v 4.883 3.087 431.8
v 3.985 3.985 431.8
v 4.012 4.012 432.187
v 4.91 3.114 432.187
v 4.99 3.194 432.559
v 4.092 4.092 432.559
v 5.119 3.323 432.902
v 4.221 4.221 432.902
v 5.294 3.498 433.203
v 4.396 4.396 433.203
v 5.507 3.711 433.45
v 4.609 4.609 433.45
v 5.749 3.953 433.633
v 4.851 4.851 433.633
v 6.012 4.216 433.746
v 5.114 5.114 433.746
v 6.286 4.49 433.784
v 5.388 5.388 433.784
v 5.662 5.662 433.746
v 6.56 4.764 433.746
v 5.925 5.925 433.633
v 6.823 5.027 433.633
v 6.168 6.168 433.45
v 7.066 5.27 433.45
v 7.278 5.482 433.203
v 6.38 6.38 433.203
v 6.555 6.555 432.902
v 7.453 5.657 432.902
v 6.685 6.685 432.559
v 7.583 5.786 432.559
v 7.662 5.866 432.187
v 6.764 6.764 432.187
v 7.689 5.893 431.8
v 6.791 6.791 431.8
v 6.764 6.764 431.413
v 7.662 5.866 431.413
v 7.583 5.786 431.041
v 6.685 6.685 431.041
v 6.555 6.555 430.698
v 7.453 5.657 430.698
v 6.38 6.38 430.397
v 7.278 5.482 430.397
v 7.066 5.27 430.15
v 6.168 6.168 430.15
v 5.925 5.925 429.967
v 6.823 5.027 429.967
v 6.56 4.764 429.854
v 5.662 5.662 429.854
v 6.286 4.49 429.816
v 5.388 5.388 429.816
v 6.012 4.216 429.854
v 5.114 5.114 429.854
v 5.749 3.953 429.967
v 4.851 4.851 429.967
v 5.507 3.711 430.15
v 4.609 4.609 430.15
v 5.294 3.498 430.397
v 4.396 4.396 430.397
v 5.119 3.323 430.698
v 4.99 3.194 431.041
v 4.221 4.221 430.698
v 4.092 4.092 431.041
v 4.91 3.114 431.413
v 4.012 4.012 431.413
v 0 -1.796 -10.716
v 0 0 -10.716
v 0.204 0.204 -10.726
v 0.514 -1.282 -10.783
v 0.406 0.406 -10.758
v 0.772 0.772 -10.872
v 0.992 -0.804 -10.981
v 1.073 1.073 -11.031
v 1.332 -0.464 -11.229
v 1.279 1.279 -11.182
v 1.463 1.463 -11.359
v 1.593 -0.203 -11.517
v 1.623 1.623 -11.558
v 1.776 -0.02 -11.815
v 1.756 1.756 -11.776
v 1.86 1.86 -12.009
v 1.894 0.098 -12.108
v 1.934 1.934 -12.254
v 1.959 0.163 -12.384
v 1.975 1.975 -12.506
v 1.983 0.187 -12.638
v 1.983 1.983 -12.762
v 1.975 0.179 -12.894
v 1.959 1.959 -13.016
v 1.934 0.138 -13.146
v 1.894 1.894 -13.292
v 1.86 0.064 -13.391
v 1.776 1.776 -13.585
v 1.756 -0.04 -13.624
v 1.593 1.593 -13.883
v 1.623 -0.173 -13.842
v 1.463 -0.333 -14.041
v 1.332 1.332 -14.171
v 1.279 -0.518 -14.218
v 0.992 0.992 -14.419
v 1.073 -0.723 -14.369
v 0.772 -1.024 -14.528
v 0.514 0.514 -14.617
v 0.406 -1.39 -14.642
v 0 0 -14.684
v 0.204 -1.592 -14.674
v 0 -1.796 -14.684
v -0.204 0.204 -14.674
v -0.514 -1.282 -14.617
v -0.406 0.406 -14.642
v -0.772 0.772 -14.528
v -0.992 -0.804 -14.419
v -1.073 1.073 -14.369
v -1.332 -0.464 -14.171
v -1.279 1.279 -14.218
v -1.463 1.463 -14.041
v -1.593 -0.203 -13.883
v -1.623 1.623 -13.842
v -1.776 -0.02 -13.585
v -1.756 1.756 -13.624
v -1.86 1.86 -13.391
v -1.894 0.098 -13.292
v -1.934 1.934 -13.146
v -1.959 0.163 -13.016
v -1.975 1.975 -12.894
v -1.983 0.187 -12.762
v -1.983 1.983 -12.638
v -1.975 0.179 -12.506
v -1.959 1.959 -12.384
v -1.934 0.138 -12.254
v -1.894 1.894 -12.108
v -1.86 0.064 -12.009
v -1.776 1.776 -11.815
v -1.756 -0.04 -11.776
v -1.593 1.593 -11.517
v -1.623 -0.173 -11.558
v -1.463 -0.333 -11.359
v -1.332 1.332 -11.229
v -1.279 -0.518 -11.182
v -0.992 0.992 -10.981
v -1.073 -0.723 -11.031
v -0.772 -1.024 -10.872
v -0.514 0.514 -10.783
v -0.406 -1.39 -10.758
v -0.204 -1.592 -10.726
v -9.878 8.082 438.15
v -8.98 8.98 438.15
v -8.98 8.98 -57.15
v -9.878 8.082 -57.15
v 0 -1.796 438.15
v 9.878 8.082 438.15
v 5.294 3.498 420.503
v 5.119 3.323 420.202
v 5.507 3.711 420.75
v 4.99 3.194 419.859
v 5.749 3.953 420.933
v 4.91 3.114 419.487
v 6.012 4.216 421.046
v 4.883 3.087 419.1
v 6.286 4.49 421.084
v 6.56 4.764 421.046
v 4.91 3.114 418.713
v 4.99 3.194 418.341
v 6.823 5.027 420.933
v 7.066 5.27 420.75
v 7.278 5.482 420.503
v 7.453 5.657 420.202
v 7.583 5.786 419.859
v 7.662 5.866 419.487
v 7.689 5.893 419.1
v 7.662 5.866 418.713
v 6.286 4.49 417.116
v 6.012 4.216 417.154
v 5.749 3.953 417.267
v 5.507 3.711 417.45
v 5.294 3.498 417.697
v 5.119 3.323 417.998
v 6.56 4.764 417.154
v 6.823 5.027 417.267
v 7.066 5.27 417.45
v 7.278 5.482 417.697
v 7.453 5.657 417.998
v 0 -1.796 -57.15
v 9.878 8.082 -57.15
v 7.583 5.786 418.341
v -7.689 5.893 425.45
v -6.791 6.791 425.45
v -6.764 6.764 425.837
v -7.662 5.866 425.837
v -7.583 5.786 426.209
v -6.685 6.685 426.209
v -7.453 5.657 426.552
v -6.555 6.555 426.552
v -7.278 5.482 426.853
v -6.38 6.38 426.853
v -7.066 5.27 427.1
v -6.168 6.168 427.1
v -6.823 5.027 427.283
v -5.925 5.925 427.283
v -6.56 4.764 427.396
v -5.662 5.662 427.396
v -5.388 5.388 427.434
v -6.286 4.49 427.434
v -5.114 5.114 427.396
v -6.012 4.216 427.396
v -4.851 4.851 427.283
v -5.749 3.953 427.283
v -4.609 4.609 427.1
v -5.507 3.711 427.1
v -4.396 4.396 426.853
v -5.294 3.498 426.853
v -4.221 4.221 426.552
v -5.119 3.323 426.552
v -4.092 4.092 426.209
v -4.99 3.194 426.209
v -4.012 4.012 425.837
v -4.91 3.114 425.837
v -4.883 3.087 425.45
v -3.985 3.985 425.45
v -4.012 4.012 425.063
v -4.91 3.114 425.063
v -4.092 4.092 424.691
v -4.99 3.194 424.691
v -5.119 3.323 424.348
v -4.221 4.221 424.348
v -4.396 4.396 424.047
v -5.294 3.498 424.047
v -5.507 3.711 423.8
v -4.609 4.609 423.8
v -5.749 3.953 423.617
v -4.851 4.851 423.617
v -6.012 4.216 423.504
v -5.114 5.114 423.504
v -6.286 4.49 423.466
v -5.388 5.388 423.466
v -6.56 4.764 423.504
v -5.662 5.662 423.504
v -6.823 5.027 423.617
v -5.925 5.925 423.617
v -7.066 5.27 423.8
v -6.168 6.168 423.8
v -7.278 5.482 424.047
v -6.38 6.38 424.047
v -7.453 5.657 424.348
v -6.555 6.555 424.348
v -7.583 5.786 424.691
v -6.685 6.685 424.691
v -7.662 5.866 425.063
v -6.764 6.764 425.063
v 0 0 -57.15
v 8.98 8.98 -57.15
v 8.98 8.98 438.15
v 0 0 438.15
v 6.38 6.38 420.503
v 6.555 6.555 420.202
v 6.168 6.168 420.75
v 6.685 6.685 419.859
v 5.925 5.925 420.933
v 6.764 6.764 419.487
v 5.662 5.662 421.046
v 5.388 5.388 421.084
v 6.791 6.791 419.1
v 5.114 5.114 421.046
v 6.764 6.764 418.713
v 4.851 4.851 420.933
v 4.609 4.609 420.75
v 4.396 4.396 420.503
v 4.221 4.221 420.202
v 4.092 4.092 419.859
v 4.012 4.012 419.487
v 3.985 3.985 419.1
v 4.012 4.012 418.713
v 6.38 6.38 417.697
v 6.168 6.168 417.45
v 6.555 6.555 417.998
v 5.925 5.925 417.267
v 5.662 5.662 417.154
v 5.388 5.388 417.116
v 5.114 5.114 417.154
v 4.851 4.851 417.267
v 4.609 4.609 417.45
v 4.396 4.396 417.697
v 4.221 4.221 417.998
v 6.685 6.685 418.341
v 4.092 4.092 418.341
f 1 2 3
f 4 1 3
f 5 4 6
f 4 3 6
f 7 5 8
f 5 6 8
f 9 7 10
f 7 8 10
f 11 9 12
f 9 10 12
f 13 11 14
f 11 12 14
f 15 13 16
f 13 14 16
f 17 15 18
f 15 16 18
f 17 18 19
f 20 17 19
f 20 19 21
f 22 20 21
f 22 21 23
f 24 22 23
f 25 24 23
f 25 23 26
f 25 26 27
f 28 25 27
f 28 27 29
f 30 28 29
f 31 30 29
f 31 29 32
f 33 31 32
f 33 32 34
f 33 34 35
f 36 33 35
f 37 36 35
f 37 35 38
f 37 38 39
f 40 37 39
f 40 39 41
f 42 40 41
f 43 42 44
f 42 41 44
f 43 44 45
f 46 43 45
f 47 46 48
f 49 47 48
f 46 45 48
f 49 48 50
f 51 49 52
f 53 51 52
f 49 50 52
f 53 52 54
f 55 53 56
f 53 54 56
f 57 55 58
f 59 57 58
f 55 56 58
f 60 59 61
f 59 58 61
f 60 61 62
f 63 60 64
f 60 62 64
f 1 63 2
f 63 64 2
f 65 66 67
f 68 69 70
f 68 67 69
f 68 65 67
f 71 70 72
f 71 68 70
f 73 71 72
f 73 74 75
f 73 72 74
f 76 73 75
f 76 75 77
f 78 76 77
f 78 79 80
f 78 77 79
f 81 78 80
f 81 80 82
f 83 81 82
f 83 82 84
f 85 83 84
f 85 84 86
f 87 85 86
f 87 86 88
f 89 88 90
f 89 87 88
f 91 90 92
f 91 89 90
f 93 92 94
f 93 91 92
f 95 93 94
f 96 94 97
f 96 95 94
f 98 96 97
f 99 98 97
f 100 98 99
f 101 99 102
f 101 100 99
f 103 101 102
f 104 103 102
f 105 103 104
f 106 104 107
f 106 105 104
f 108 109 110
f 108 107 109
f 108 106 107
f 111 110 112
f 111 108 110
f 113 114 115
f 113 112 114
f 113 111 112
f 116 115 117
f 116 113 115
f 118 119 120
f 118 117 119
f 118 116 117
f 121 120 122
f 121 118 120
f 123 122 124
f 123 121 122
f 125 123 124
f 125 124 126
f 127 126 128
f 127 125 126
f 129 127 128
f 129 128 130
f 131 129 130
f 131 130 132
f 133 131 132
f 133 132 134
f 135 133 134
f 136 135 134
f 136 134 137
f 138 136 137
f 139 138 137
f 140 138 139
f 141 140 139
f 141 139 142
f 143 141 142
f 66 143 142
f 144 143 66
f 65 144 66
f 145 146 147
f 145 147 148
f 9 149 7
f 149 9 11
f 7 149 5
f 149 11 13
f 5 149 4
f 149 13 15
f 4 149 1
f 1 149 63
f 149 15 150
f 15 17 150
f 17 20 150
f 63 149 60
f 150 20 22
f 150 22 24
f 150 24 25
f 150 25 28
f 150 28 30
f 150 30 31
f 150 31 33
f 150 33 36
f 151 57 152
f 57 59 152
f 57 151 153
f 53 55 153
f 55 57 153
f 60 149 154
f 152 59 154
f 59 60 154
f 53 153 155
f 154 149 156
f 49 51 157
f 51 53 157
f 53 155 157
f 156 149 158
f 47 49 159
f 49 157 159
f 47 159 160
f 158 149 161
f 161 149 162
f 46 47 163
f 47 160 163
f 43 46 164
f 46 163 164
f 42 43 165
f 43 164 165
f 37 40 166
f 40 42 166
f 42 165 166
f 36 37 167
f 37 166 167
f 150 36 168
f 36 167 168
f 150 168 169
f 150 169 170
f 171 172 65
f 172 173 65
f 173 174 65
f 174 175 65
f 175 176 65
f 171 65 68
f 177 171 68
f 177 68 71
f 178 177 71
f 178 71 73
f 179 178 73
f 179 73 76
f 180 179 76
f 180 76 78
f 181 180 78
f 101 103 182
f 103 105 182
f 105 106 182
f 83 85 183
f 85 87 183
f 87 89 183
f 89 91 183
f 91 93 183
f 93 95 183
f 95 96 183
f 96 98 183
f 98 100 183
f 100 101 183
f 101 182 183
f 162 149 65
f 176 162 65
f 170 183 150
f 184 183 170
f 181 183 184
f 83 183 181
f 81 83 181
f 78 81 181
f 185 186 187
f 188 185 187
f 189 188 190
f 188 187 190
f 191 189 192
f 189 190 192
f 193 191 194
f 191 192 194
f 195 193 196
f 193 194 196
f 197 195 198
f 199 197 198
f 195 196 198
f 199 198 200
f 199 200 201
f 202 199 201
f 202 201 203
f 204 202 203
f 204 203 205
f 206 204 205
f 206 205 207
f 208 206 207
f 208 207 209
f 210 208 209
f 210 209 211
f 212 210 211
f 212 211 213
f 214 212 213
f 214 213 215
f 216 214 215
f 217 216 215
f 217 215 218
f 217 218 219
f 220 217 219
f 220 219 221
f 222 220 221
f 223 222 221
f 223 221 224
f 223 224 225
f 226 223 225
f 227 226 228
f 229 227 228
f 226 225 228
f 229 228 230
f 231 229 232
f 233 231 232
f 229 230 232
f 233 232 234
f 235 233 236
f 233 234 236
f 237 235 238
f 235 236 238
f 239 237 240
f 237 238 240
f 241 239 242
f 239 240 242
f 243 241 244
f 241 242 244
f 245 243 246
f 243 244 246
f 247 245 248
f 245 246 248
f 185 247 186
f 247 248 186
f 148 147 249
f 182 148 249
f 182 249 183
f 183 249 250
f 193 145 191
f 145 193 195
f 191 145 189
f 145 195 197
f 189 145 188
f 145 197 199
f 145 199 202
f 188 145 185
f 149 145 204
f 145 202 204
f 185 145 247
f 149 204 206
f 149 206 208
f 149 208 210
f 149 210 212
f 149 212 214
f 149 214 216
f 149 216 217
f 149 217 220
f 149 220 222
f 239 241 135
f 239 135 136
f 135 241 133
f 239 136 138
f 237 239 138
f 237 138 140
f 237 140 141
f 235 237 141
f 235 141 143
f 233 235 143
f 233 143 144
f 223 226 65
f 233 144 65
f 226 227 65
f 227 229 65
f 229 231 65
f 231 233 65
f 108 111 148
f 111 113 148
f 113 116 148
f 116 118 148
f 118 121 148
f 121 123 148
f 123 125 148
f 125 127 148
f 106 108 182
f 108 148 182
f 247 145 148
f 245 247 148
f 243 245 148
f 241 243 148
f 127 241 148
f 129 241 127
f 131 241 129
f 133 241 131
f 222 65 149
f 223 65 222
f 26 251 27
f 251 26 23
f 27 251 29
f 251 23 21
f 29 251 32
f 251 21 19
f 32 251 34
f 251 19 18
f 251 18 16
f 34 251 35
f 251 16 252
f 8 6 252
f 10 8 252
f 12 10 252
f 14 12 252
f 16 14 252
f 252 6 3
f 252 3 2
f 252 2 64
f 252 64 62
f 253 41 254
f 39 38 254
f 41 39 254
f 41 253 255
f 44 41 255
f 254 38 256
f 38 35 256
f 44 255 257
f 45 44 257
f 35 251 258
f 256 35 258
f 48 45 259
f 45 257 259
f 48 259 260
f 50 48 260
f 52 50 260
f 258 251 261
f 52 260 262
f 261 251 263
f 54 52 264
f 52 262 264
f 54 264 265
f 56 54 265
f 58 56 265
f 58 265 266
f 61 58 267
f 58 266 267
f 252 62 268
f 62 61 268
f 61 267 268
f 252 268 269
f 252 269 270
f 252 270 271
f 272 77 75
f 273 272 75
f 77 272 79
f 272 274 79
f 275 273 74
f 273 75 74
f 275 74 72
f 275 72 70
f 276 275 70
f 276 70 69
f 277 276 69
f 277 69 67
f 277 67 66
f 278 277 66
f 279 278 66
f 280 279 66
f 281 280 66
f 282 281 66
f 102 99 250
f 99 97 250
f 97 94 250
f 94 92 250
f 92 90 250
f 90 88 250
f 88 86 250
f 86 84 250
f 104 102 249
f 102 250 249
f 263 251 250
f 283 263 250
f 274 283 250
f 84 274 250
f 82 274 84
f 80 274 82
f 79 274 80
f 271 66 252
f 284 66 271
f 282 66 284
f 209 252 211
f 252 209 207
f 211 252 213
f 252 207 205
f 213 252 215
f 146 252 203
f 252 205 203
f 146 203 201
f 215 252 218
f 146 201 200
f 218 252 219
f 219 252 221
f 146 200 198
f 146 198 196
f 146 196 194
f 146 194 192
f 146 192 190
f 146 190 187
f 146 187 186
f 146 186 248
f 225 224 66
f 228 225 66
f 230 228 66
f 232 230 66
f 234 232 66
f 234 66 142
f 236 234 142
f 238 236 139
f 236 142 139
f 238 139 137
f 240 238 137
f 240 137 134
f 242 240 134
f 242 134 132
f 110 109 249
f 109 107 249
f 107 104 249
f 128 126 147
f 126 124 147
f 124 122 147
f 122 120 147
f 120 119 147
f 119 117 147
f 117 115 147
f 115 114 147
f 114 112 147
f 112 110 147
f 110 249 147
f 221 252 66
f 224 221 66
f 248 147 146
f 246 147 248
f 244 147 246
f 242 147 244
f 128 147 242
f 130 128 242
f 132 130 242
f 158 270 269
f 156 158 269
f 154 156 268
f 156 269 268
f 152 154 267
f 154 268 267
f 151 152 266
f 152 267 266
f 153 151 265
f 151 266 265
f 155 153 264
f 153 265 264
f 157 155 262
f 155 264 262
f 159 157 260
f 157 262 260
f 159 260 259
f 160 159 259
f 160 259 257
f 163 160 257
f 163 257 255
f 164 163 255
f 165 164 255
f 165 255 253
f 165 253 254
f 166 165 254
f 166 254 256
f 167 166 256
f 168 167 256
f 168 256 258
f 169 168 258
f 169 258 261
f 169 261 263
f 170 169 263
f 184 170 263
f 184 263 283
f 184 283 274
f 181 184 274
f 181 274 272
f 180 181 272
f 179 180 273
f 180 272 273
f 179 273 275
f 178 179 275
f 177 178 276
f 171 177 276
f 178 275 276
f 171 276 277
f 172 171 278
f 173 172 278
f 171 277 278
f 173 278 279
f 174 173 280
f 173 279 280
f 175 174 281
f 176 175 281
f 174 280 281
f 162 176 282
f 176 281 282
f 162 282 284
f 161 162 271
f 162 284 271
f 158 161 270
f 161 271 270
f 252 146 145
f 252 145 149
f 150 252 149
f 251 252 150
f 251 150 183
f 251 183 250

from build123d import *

# Parameters (mm, degrees)
BOSS_EXTRUDE1_DEPTH      = 438.15
BOSS_EXTRUDE1_DEPTH_BACK = 57.15
SKETCH2_R                = 1.984375
CUT_EXTRUDE1_DEPTH       = 439.353336876
SKETCH3_R                = 1.984375
CUT_EXTRUDE2_DEPTH       = 439.353336876
CUT_EXTRUDE3_DEPTH       = 439.353336876
CUT_EXTRUDE3_DEPTH_BACK  = 439.353336876
SKETCH4_R                = 1.984375


with BuildPart() as part:
    # Sketch1 → Boss-Extrude1 (new, two sides: drawn at the far end of the back side and taken through both)
    with BuildSketch(Plane.XY.offset(-BOSS_EXTRUDE1_DEPTH_BACK)):
        Polygon((0, 0), (-8.980256121, 8.980256121), (-9.878281733, 8.082230509), (0, -1.796051224), (9.878281733, 8.082230509), (8.980256121, 8.980256121), align=None)
    extrude(amount=BOSS_EXTRUDE1_DEPTH + BOSS_EXTRUDE1_DEPTH_BACK)

    # Sketch2 → Cut-Extrude1 (cut, through all)
    with BuildSketch(Plane(origin=(0, 0, 0), x_dir=(0, 0, 1), z_dir=(-0.7071067811865469, 0.7071067811865481, 0))):
        with Locations(Location((431.8, 7.62, 0), (0, 0, 270))):
            Circle(SKETCH2_R)
        with Locations(Location((419.1, 7.62, 0), (0, 0, 270))):
            Circle(SKETCH2_R)
    extrude(amount=-CUT_EXTRUDE1_DEPTH, mode=Mode.SUBTRACT)

    # Sketch3 → Cut-Extrude2 (cut, through all)
    with BuildSketch(Plane(origin=(0, 0, 0), x_dir=(0, 0, -1), z_dir=(0.7071067811865483, 0.7071067811865468, 0))):
        with Locations(Location((-425.45, 7.62, 0), (0, 0, 90))):
            Circle(SKETCH3_R)
    extrude(amount=-CUT_EXTRUDE2_DEPTH, mode=Mode.SUBTRACT)

    # Sketch4 → Cut-Extrude3 (cut, two sides: drawn at the far end of the back side and taken through both)
    with BuildSketch(Plane(origin=(0, 0, 0), x_dir=(1, 0, 0), z_dir=(0, 1, 0)).offset(-CUT_EXTRUDE3_DEPTH_BACK)):
        with Locations(Location((0, 12.7, 0), (0, 0, 270))):
            Circle(SKETCH4_R)
    extrude(amount=CUT_EXTRUDE3_DEPTH + CUT_EXTRUDE3_DEPTH_BACK, mode=Mode.SUBTRACT)


solid = part.part
